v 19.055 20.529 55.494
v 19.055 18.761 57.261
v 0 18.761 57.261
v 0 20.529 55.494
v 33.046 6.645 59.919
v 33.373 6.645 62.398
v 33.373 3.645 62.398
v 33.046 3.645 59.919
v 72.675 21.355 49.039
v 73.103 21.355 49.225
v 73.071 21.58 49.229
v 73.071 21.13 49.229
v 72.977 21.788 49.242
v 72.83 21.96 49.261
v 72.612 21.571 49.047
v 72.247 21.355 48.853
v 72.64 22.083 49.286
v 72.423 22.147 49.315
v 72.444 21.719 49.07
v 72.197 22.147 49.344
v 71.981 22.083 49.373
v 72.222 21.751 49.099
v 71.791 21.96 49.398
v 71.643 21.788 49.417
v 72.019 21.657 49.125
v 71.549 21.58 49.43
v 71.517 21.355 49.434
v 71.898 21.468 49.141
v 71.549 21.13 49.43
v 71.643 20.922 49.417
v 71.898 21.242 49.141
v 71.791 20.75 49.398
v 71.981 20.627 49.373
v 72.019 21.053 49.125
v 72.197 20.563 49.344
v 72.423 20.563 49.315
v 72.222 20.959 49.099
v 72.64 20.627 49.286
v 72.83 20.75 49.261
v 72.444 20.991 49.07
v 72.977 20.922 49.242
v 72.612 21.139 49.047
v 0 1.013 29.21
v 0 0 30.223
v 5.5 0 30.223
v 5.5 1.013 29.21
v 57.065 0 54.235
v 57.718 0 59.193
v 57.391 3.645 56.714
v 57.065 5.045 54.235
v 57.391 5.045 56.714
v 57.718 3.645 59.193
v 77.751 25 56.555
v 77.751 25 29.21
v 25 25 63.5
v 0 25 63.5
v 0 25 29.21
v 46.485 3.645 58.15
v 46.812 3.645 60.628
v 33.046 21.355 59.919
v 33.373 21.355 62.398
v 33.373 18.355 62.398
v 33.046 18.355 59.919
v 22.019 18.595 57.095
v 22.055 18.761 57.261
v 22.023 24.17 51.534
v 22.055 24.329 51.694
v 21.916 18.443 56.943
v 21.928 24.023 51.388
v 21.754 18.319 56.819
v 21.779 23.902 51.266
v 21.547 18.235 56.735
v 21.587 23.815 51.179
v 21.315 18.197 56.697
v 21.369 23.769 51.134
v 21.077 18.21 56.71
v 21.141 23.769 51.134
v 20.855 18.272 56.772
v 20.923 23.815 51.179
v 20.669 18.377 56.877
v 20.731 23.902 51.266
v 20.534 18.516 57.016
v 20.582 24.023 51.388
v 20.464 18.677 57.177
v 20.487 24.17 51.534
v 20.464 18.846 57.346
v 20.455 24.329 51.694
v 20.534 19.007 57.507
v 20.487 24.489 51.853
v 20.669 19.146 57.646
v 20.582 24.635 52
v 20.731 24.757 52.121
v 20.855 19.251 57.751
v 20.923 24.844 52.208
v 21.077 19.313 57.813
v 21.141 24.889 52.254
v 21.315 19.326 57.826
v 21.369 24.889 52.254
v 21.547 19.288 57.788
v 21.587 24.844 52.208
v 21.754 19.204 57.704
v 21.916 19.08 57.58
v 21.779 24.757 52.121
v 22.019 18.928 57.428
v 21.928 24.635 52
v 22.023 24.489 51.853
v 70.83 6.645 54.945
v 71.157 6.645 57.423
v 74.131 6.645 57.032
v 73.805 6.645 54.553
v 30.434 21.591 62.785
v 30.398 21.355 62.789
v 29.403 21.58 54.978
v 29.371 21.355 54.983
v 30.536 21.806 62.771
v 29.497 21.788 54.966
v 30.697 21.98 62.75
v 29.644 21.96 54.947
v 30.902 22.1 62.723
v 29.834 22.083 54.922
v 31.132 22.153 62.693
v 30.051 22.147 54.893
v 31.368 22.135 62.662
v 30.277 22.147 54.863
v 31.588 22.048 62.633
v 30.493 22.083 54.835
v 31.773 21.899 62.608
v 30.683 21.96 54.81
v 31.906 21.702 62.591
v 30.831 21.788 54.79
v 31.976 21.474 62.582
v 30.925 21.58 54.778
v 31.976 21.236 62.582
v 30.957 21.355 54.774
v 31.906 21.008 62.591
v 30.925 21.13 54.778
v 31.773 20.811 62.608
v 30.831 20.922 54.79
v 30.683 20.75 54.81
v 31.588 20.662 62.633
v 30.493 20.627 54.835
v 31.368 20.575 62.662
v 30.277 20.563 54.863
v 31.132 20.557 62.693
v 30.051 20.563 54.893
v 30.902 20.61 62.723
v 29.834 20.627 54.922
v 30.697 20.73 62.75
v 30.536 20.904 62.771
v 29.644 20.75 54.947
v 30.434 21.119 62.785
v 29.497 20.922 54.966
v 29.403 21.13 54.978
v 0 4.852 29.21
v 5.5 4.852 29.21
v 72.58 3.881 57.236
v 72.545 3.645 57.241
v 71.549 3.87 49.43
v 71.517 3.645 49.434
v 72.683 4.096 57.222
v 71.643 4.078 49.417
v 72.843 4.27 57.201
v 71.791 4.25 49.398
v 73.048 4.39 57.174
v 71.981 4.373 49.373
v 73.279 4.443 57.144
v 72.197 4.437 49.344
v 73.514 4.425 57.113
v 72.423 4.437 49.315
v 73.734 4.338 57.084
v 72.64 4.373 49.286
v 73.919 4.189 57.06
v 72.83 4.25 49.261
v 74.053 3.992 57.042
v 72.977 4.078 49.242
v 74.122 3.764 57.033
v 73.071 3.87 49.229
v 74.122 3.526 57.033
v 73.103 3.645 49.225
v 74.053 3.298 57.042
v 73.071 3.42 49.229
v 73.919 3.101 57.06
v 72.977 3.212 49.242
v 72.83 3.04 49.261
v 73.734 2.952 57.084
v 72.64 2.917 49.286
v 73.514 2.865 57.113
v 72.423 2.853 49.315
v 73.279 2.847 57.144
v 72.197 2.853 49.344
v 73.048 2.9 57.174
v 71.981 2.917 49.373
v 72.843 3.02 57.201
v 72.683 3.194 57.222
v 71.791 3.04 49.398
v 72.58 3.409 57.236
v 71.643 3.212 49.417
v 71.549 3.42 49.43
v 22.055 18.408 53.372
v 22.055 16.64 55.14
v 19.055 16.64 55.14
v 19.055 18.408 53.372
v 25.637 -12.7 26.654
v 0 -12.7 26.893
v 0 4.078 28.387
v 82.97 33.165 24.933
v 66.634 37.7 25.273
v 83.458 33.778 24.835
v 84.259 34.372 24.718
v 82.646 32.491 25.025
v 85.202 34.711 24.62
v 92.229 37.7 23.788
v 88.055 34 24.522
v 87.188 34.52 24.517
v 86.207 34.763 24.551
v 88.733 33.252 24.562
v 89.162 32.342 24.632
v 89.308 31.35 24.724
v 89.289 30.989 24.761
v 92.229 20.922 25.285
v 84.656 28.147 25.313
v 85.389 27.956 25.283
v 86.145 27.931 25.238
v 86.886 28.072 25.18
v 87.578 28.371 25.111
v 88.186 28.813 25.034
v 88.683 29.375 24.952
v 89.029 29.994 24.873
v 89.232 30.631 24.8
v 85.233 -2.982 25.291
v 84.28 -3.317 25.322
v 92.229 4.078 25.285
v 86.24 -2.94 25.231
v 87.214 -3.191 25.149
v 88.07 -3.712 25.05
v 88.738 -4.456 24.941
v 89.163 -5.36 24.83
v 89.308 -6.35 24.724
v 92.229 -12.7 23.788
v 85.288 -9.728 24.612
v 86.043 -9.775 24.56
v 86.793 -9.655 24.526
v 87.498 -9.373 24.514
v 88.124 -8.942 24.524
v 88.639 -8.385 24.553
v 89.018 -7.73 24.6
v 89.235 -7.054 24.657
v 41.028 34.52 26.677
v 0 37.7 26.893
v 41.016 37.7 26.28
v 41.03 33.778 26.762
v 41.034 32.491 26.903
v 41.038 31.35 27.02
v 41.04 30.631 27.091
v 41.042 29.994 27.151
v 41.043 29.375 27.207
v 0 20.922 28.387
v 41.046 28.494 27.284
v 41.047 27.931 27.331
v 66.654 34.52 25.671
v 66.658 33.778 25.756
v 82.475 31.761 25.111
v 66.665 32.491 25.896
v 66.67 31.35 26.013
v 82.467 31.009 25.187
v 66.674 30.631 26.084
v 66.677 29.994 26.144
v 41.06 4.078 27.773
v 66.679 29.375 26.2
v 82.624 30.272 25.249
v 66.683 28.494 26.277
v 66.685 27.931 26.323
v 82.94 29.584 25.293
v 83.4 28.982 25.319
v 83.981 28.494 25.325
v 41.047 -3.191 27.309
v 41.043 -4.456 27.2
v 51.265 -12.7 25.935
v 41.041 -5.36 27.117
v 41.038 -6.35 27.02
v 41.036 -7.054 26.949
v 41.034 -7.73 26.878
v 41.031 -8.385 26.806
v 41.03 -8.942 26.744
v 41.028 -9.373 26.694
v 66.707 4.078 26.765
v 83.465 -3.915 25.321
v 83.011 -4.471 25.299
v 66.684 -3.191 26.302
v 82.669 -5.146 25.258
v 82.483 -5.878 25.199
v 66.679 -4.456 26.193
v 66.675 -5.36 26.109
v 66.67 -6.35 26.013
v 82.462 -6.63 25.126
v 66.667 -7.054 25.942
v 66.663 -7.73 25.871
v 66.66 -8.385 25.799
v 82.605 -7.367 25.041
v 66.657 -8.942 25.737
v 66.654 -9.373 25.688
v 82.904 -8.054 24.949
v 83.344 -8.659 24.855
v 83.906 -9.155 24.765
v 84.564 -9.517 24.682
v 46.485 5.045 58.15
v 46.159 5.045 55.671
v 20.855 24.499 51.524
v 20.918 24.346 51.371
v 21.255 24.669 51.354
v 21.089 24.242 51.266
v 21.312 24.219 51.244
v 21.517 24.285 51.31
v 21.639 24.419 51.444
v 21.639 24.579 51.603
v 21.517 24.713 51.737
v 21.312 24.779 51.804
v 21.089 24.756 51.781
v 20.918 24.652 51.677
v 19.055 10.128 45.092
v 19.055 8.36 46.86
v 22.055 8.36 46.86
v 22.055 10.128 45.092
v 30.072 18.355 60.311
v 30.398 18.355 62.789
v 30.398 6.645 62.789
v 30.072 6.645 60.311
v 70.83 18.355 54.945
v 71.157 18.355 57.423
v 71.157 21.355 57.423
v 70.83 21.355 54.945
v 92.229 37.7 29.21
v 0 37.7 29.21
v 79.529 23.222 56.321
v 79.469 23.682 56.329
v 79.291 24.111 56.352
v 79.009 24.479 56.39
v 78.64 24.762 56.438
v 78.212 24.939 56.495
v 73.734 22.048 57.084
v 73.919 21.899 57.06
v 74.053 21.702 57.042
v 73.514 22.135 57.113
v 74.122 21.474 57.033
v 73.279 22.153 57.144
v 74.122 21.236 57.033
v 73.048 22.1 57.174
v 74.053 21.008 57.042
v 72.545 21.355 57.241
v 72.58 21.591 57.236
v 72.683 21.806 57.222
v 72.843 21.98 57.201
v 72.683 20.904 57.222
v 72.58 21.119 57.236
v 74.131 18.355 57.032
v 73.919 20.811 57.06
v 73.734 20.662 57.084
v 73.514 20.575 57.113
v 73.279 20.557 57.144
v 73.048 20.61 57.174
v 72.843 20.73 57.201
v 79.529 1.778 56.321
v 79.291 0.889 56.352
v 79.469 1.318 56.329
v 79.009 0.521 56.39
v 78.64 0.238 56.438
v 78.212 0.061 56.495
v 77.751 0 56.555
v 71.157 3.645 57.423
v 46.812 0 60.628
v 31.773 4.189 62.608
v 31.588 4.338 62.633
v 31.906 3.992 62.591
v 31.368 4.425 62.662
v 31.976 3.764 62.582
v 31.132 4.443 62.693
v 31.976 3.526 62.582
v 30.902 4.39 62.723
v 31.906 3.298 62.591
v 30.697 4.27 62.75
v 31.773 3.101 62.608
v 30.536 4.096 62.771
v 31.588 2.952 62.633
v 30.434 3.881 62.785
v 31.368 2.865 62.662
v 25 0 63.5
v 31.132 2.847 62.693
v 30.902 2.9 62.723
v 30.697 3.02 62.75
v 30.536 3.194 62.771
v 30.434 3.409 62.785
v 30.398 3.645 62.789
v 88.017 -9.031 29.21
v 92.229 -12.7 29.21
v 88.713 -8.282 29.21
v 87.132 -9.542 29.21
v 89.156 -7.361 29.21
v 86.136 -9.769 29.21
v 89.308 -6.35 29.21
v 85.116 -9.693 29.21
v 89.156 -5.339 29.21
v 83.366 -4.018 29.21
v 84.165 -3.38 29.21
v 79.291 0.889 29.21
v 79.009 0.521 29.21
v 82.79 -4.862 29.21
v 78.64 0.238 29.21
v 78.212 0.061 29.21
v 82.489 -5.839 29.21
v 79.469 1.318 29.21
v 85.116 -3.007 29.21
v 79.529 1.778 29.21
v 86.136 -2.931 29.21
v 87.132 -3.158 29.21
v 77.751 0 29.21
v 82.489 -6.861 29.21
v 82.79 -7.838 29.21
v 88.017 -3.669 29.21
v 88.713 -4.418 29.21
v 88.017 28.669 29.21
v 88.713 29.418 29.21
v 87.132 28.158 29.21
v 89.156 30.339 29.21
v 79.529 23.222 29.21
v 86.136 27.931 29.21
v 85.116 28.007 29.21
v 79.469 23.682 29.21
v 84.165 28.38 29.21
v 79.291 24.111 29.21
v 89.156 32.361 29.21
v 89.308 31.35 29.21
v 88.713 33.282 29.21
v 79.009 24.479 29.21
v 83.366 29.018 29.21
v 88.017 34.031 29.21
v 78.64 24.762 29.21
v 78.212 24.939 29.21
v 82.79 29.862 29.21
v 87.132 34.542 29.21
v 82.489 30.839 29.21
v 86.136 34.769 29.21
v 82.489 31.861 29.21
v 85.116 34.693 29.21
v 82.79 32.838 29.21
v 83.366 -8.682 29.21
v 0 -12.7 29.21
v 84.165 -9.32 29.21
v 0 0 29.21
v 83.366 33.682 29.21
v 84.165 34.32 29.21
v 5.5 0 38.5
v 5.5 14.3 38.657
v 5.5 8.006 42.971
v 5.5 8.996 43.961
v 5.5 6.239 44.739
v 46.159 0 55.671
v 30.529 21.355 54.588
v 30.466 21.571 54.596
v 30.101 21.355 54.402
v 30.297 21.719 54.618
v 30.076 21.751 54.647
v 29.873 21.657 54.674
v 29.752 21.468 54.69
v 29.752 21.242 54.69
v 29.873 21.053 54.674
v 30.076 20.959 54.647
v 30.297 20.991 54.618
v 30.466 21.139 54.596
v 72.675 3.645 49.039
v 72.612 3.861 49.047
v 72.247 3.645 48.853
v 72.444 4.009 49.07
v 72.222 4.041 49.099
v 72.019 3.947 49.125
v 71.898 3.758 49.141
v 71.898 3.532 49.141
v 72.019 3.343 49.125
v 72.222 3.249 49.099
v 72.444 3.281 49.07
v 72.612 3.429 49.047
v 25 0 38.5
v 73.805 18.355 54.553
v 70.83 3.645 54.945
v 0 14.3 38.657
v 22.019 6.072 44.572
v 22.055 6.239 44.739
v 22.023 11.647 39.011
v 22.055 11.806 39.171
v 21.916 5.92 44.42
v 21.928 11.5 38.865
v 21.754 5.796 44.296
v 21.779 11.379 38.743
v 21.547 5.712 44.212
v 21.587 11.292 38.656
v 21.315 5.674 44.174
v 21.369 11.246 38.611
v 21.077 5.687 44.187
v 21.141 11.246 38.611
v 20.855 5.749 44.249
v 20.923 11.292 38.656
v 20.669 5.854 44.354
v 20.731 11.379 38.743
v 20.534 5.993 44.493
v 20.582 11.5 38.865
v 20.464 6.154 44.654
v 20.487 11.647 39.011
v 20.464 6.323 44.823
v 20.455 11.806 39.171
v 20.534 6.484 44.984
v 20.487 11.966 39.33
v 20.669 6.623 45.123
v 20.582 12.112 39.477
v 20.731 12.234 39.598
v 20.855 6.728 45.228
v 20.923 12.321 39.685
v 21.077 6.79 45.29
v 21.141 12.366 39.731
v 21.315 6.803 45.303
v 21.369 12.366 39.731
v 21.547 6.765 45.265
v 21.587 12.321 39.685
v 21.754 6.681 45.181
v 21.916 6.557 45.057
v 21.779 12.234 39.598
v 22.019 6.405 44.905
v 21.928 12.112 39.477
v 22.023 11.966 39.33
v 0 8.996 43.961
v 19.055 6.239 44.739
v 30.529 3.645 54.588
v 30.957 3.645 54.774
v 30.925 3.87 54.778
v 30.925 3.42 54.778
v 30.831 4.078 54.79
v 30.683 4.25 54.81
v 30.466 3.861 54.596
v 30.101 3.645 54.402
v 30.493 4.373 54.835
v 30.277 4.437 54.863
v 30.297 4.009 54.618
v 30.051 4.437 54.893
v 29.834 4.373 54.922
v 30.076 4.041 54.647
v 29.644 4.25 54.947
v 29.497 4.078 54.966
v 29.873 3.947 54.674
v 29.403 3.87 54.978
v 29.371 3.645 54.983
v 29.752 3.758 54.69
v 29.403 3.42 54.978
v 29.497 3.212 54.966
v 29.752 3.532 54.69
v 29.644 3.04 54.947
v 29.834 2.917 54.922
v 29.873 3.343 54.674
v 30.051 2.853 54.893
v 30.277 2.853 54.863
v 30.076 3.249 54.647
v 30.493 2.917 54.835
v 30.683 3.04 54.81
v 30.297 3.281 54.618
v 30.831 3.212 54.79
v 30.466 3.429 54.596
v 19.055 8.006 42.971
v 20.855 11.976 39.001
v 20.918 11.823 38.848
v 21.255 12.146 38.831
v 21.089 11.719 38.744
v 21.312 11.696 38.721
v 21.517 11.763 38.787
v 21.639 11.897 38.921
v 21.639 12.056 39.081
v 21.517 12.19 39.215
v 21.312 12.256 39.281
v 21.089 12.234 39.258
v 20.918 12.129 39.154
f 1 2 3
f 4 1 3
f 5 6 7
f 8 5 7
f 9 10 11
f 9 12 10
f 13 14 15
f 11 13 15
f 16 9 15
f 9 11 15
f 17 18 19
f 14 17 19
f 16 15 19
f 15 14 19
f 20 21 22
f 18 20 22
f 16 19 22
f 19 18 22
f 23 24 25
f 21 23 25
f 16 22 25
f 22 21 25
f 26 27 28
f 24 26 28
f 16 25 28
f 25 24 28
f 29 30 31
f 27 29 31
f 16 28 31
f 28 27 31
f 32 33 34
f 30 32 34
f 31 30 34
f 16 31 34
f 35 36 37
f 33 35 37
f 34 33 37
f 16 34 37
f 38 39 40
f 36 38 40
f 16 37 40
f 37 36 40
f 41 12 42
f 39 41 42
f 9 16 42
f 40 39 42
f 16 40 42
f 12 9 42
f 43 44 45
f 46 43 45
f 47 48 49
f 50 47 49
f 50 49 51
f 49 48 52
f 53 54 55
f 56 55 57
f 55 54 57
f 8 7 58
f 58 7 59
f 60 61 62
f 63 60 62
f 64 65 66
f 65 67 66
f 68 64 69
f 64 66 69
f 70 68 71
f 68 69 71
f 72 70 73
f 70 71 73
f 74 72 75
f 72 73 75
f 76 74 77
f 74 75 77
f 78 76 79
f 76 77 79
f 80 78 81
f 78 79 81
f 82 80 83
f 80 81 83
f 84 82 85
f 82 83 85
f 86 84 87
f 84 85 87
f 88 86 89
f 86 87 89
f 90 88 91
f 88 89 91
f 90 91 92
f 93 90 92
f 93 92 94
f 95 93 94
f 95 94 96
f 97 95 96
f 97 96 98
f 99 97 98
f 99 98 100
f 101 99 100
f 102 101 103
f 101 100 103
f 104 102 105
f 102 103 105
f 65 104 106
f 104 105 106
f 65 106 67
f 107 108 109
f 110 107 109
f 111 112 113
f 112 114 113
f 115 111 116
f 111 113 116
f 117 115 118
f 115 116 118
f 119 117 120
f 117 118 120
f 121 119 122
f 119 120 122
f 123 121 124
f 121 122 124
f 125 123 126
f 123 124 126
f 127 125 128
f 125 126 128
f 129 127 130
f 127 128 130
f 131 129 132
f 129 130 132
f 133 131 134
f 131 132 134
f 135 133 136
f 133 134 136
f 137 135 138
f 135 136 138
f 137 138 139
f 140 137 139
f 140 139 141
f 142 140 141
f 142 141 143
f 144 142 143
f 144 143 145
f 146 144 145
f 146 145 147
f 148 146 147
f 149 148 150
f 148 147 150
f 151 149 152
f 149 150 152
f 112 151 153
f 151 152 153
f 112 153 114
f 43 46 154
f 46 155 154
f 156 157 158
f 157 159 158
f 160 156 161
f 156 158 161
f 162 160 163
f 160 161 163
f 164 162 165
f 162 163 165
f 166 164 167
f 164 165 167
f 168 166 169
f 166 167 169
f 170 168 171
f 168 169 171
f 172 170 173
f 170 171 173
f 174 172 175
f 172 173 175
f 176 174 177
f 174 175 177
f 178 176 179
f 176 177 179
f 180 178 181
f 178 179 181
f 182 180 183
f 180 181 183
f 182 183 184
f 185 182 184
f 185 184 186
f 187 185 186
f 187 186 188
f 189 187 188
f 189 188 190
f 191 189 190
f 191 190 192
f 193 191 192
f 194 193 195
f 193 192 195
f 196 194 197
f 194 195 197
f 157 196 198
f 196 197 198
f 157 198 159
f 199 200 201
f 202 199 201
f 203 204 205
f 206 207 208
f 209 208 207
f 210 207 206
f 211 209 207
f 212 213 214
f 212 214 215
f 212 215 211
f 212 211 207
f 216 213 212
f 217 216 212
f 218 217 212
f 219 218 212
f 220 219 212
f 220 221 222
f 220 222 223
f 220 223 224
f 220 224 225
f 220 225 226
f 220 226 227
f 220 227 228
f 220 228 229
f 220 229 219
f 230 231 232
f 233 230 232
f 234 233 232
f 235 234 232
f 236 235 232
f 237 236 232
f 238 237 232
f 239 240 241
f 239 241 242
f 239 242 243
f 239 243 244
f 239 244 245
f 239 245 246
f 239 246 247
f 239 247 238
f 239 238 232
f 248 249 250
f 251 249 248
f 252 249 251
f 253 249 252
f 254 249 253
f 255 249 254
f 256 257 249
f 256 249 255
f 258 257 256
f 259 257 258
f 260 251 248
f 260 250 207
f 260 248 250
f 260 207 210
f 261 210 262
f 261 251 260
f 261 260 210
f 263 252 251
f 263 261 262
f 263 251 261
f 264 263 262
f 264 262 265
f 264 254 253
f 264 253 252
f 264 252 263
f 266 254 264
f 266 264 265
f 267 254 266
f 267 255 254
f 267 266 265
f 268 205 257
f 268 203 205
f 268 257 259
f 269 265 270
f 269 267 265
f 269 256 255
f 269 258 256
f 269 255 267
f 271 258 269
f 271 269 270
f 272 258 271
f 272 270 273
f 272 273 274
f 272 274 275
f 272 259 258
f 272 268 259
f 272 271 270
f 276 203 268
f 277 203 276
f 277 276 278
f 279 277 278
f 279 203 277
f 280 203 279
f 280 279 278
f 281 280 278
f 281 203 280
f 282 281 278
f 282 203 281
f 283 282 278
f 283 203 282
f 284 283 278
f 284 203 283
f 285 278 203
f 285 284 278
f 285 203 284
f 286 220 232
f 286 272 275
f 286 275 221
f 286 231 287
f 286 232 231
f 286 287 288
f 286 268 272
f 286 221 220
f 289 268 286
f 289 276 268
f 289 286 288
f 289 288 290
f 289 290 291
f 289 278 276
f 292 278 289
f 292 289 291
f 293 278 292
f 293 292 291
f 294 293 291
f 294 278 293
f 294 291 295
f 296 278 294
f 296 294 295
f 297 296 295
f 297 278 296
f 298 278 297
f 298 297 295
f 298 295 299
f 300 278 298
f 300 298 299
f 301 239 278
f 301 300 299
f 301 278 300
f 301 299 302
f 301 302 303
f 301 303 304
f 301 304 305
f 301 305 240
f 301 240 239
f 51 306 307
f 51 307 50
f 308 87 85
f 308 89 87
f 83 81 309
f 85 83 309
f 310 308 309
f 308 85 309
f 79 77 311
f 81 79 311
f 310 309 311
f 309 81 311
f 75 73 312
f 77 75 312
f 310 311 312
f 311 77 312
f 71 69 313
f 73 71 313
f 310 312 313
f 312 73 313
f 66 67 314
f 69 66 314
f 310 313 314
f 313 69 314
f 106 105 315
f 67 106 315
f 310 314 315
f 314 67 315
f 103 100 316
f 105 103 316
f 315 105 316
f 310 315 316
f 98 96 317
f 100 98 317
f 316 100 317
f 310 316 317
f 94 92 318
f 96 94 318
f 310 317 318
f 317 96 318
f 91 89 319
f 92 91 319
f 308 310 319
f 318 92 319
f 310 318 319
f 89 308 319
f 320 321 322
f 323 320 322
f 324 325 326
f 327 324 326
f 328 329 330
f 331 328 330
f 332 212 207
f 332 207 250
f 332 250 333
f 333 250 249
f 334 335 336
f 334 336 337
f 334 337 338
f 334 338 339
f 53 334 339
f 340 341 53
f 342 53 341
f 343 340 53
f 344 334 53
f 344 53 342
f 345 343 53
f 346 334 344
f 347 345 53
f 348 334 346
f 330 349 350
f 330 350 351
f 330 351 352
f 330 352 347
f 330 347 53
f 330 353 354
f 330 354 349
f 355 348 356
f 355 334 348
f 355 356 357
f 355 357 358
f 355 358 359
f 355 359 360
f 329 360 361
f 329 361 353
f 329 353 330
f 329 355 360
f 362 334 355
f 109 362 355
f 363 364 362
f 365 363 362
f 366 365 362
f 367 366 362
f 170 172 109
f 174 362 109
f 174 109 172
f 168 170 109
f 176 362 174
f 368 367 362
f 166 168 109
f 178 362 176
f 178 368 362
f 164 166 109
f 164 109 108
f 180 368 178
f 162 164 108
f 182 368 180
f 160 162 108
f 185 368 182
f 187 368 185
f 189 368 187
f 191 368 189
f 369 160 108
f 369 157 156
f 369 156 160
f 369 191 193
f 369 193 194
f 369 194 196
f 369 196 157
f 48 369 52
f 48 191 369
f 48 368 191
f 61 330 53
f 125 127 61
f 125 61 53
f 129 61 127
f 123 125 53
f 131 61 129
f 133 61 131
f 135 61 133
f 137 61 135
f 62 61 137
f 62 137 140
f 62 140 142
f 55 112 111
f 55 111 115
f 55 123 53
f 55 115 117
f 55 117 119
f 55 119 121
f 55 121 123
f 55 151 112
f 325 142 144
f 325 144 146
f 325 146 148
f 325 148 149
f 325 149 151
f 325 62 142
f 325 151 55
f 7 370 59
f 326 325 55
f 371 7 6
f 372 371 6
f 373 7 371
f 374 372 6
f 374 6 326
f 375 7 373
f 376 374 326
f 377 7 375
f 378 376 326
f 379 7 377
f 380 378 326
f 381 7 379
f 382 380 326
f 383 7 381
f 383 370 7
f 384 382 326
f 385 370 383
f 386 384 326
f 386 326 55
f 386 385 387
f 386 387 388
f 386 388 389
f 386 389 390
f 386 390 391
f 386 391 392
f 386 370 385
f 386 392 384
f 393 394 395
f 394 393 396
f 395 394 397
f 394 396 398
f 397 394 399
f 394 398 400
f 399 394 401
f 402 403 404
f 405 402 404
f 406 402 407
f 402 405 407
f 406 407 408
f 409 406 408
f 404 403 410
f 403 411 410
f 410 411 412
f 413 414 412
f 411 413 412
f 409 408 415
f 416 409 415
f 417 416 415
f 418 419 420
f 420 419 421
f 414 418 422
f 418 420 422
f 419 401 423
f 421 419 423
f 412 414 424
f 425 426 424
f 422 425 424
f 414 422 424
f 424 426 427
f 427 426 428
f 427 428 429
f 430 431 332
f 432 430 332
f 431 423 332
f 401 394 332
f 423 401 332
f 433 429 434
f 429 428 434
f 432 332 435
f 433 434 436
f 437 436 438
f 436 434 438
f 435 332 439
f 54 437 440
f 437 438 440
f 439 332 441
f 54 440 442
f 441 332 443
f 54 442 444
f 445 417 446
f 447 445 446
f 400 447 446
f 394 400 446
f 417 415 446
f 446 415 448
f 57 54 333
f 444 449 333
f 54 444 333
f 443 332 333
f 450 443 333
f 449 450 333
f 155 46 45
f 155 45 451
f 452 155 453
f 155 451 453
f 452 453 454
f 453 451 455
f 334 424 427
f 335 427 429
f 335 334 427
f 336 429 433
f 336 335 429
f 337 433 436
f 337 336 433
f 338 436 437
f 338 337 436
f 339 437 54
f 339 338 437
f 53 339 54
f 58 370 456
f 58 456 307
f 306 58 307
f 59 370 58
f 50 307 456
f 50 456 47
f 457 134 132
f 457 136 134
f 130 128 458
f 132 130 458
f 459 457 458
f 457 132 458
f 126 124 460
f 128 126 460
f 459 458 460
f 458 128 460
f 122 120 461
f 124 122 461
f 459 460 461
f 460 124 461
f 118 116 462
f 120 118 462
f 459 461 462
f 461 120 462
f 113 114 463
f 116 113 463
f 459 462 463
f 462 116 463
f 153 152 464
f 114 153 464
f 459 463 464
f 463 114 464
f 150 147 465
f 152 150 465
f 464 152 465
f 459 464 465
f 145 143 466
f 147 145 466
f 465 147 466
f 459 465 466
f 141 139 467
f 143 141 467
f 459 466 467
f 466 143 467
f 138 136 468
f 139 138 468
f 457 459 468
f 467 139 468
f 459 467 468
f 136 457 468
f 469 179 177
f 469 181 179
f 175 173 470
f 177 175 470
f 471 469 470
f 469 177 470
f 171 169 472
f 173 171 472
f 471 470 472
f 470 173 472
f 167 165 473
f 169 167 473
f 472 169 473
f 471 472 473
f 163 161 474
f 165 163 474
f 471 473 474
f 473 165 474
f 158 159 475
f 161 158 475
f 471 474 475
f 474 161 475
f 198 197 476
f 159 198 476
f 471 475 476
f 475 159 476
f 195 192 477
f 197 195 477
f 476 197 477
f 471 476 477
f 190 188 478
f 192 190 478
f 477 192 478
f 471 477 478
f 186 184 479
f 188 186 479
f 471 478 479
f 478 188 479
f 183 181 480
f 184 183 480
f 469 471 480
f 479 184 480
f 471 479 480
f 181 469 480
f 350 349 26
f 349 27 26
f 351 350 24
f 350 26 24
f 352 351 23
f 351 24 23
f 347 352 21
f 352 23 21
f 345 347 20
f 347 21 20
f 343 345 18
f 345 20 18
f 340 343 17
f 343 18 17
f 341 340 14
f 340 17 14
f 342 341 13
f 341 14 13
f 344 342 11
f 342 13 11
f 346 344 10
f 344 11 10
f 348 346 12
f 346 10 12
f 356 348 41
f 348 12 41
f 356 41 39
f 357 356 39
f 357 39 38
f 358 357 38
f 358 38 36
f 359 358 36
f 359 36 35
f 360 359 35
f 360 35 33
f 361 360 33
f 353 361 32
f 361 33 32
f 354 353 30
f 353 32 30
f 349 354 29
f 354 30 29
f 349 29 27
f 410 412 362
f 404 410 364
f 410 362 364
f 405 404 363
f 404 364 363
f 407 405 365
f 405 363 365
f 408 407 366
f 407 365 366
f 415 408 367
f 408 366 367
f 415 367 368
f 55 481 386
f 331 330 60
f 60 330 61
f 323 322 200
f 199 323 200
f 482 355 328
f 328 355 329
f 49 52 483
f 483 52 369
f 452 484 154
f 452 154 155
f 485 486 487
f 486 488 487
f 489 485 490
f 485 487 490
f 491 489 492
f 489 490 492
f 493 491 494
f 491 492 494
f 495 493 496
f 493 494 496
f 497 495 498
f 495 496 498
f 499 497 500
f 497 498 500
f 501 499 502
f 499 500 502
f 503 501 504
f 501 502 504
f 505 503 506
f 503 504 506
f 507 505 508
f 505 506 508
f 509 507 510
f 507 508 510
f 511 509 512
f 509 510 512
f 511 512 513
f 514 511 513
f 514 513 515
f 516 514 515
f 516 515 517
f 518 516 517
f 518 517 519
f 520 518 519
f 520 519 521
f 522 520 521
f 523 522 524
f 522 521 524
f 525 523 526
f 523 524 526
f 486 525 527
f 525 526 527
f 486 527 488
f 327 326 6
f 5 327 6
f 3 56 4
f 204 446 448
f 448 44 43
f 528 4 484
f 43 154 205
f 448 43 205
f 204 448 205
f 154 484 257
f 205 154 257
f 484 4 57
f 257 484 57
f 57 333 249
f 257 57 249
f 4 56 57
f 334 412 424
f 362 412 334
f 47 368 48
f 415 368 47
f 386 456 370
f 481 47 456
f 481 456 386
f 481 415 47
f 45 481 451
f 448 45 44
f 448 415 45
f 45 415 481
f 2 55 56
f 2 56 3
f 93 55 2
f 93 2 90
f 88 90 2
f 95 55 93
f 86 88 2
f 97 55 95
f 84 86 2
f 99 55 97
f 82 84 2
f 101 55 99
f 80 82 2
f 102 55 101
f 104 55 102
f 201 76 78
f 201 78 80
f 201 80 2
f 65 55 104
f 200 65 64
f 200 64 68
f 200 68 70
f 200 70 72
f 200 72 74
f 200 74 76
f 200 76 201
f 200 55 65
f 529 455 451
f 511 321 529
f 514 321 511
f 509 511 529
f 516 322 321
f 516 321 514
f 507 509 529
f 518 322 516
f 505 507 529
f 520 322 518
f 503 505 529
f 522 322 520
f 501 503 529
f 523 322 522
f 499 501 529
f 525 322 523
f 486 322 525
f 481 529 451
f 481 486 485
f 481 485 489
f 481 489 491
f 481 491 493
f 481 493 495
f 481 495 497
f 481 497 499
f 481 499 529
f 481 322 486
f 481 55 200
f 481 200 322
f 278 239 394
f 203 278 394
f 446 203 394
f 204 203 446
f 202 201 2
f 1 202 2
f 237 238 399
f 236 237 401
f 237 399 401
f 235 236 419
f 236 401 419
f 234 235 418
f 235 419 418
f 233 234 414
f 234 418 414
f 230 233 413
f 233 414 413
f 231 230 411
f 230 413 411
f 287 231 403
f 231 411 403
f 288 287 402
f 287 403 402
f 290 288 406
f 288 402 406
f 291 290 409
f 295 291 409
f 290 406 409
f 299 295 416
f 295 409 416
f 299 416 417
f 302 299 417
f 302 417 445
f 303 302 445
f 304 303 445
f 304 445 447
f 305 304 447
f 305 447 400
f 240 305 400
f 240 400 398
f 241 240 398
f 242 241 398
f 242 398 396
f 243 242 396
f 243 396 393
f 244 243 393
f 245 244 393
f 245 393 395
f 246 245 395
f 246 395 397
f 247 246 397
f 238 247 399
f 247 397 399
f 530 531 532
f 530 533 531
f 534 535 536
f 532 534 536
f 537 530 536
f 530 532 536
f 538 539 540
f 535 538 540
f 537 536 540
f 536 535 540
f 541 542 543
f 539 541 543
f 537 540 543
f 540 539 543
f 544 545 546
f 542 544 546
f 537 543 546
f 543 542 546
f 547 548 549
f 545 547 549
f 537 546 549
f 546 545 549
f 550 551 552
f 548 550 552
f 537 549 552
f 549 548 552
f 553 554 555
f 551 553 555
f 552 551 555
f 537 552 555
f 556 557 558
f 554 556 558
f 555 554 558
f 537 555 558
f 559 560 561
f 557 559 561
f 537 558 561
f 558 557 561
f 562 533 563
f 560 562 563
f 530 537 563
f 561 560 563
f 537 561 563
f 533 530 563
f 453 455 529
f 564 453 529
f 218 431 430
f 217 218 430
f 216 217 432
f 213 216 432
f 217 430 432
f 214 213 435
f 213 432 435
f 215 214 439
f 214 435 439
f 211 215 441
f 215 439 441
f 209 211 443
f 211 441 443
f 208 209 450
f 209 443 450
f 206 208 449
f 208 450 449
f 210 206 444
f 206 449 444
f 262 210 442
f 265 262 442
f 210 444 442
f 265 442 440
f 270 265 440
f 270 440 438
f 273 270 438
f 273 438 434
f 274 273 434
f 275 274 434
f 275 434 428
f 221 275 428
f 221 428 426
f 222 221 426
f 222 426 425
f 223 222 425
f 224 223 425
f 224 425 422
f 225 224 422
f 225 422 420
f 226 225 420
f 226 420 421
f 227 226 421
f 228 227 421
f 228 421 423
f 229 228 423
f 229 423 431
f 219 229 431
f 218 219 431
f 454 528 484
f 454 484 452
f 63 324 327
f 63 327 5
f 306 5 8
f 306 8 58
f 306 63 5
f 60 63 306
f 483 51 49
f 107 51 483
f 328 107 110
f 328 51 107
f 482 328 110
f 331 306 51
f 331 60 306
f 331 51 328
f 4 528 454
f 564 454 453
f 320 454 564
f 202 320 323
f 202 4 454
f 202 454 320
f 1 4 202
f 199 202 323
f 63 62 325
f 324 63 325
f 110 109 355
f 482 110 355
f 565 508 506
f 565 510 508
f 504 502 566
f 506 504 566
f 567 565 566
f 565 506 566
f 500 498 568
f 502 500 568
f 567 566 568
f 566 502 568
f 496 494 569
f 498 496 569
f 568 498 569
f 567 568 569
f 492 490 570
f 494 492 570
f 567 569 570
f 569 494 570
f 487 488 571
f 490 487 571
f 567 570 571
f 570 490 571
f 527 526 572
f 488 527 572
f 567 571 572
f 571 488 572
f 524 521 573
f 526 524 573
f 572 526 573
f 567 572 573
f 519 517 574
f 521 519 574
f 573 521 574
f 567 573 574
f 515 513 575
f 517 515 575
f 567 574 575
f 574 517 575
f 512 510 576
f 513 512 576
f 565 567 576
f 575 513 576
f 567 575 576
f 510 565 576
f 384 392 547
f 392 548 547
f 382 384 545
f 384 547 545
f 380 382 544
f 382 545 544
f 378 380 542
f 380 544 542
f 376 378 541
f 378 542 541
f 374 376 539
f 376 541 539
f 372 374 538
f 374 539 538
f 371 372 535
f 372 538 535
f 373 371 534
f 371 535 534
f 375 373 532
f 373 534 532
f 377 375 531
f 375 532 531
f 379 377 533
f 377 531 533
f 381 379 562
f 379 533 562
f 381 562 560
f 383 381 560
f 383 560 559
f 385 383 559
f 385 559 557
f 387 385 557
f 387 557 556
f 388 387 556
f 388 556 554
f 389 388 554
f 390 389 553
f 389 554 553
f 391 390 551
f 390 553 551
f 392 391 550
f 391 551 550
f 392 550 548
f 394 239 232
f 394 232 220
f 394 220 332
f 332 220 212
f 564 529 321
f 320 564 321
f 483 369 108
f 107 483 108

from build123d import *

# Parameters (mm, degrees)
BOSS_EXTRUDE4_DEPTH           = 25
CUT_EXTRUDE2_DEPTH            = 25
TAP_DRILL_FOR_4_40_TAP1_D     = 1.600000102
TAP_DRILL_FOR_4_40_TAP1_DEPTH = 7.874
TAP_DRILL_FOR_4_40_TAP1_TIP   = 0.480688526
TAP_DRILL_FOR_4_40_TAP3_D     = 1.600000102
TAP_DRILL_FOR_4_40_TAP3_DEPTH = 7.874
TAP_DRILL_FOR_4_40_TAP3_TIP   = 0.480688526
TAP_DRILL_FOR_4_40_TAP4_D     = 1.600000102
TAP_DRILL_FOR_4_40_TAP4_DEPTH = 7.874
TAP_DRILL_FOR_4_40_TAP4_TIP   = 0.480688526
FILLET1_R                     = 1.778
CUT_EXTRUDE3_DEPTH            = 2.5
CUT_EXTRUDE4_DEPTH            = 2.5
CUT_EXTRUDE5_DEPTH            = 2.5
SKETCH23_W                    = 11
SKETCH23_H                    = 5.045
CUT_EXTRUDE6_DEPTH            = 5
SKETCH24_W                    = 11
SKETCH24_H                    = 5.045
CUT_EXTRUDE7_DEPTH            = 5
SKETCH25_W                    = 11
SKETCH25_H                    = 16.07506189
CUT_EXTRUDE8_DEPTH            = 10
SKETCH26_W                    = 184.458934752
SKETCH26_H                    = 50.4
BOSS_EXTRUDE6_DEPTH           = 29.21
SKETCH27_R                    = 3.429
CUT_EXTRUDE9_DEPTH            = 106.37252383
SKETCH28_W                    = 115.917353875
SKETCH28_H                    = 112.19052099
CUT_EXTRUDE10_DEPTH           = 119.151659651


with BuildPart() as part:
    # Sketch6 → Boss-Extrude4 (new body)
    with BuildSketch(Plane(origin=(0, 0, 0), x_dir=(1, 0, 0), z_dir=(0, 1, 0))):
        Polygon((-79.529467376, 0), (79.529467376, 0), (79.529467376, -56.321059428), (25, -63.5), (-25, -63.5), (-79.529467376, -56.321059428), align=None)
    extrude(amount=BOSS_EXTRUDE4_DEPTH)

    # Sketch7 → Cut-Extrude2 (cut, symmetric)
    with BuildSketch(Plane(origin=(0, 0, 0), x_dir=(0, 0, -1), z_dir=(1, 0, 0))):
        Polygon((-63.5, 25), (-38.5, 0), (-63.5, 0), align=None)
    extrude(amount=CUT_EXTRUDE2_DEPTH, both=True, mode=Mode.SUBTRACT)

    # Tap Drill for #4-40 Tap1
    with Locations(Plane(origin=(0, -19.25, 19.25), x_dir=(-1, 0, 0), z_dir=(0, -0.7071067811865488, 0.7071067811865462))):
        with Locations((-21.255000035, -53.756280605), (21.255000035, -53.756280605), (21.255000035, -36.046280605), (-21.255000035, -36.046280605)):
            Hole(TAP_DRILL_FOR_4_40_TAP1_D / 2, depth=TAP_DRILL_FOR_4_40_TAP1_DEPTH)
            with Locations((0, 0, -(TAP_DRILL_FOR_4_40_TAP1_DEPTH + TAP_DRILL_FOR_4_40_TAP1_TIP / 2))):  # 118° drill point
                Cone(0, TAP_DRILL_FOR_4_40_TAP1_D / 2, TAP_DRILL_FOR_4_40_TAP1_TIP, mode=Mode.SUBTRACT)

    # Tap Drill for #4-40 Tap3
    with Locations(Plane(origin=(-8.643431853, 0, 65.653383048), x_dir=(0.9914448613738104, 0, 0.13052619222005213), z_dir=(-0.13052619222005213, 0, 0.9914448613738104))):
        with Locations((-65.252708328, 21.355), (-22.742708328, 21.355), (-22.742708328, 3.645), (-65.252708328, 3.645)):
            Hole(TAP_DRILL_FOR_4_40_TAP3_D / 2, depth=TAP_DRILL_FOR_4_40_TAP3_DEPTH)
            with Locations((0, 0, -(TAP_DRILL_FOR_4_40_TAP3_DEPTH + TAP_DRILL_FOR_4_40_TAP3_TIP / 2))):  # 118° drill point
                Cone(0, TAP_DRILL_FOR_4_40_TAP3_D / 2, TAP_DRILL_FOR_4_40_TAP3_TIP, mode=Mode.SUBTRACT)

    # Tap Drill for #4-40 Tap4
    with Locations(Plane(origin=(8.643431853, 0, 65.653383048), x_dir=(0.9914448613738104, 0, -0.13052619222005213), z_dir=(0.13052619222005213, 0, 0.9914448613738104))):
        with Locations((22.742708328, 21.355), (65.252708328, 21.355), (65.252708328, 3.645), (22.742708328, 3.645)):
            Hole(TAP_DRILL_FOR_4_40_TAP4_D / 2, depth=TAP_DRILL_FOR_4_40_TAP4_DEPTH)
            with Locations((0, 0, -(TAP_DRILL_FOR_4_40_TAP4_DEPTH + TAP_DRILL_FOR_4_40_TAP4_TIP / 2))):  # 118° drill point
                Cone(0, TAP_DRILL_FOR_4_40_TAP4_D / 2, TAP_DRILL_FOR_4_40_TAP4_TIP, mode=Mode.SUBTRACT)

    # Fillet1
    fillet1_edges = [part.edges().sort_by_distance(p)[0] for p in [
        (-79.529467376, 25, 28.160529714),
        (79.529467376, 25, 28.160529714),
        (-79.529467376, 0, 28.160529714),
        (79.529467376, 0, 28.160529714),
    ]]
    fillet(fillet1_edges, radius=FILLET1_R)

    # Sketch22 → Cut-Extrude3 (cut)
    with BuildSketch(Plane(origin=(0, -19.25, 19.25), x_dir=(1, 0, 0), z_dir=(0, -0.7071067811865488, 0.7071067811865462))):
        Polygon((-19.055000086, 53.756280605), (-19.055000086, 50.756280605), (-22.055000086, 50.756280605), (-22.055000086, 39.046280605), (-19.055000086, 39.046280605), (-19.055000086, 36.046280605), (19.055000086, 36.046280605), (19.055000086, 39.046280605), (22.055000086, 39.046280605), (22.055000086, 50.756280605), (19.055000086, 50.756280605), (19.055000086, 53.756280605), align=None)
    extrude(amount=-CUT_EXTRUDE3_DEPTH, mode=Mode.SUBTRACT)

    # Sketch21 → Cut-Extrude4 (cut)
    with BuildSketch(Plane(origin=(8.643431853, 0, 65.653383048), x_dir=(0.9914448613738104, 0, -0.13052619222005213), z_dir=(0.13052619222005213, 0, 0.9914448613738104))):
        Polygon((24.942708277, 21.355), (24.942708277, 18.355), (21.942708277, 18.355), (21.942708277, 6.645), (24.942708277, 6.645), (24.942708277, 3.645), (63.052708379, 3.645), (63.052708379, 6.645), (66.052708379, 6.645), (66.052708379, 18.355), (63.052708379, 18.355), (63.052708379, 21.355), align=None)
    extrude(amount=-CUT_EXTRUDE4_DEPTH, mode=Mode.SUBTRACT)

    # Sketch20 → Cut-Extrude5 (cut)
    with BuildSketch(Plane(origin=(-8.643431853, 0, 65.653383048), x_dir=(0.9914448613738104, 0, 0.13052619222005213), z_dir=(-0.13052619222005213, 0, 0.9914448613738104))):
        Polygon((-63.052708379, 21.355), (-63.052708379, 18.355), (-66.052708379, 18.355), (-66.052708379, 6.645), (-63.052708379, 6.645), (-63.052708379, 3.645), (-24.942708277, 3.645), (-24.942708277, 6.645), (-21.942708277, 6.645), (-21.942708277, 18.355), (-24.942708277, 18.355), (-24.942708277, 21.355), align=None)
    extrude(amount=-CUT_EXTRUDE5_DEPTH, mode=Mode.SUBTRACT)

    # Sketch23 → Cut-Extrude6 (cut)
    with BuildSketch(Plane(origin=(8.643431853, 0, 65.653383048), x_dir=(0.9914448613738104, 0, -0.13052619222005213), z_dir=(0.13052619222005213, 0, 0.9914448613738104))):
        with Locations((43.997708328, 2.5225)):
            Rectangle(SKETCH23_W, SKETCH23_H)
    extrude(amount=-CUT_EXTRUDE6_DEPTH, mode=Mode.SUBTRACT)

    # Sketch24 → Cut-Extrude7 (cut)
    with BuildSketch(Plane(origin=(-8.643431853, 0, 65.653383048), x_dir=(0.9914448613738104, 0, 0.13052619222005213), z_dir=(-0.13052619222005213, 0, 0.9914448613738104))):
        with Locations((-43.997708328, 2.5225)):
            Rectangle(SKETCH24_W, SKETCH24_H)
    extrude(amount=-CUT_EXTRUDE7_DEPTH, mode=Mode.SUBTRACT)

    # Sketch25 → Cut-Extrude8 (cut)
    with BuildSketch(Plane(origin=(0, -19.25, 19.25), x_dir=(1, 0, 0), z_dir=(0, -0.7071067811865488, 0.7071067811865462))):
        with Locations((0, 29.40874966)):
            Rectangle(SKETCH25_W, SKETCH25_H)
    extrude(amount=-CUT_EXTRUDE8_DEPTH, mode=Mode.SUBTRACT)

    # Sketch26 → Boss-Extrude6 (add)
    with BuildSketch(Plane(origin=(0, 0, 0), x_dir=(-1, 0, 0), z_dir=(0, 0, -1))):
        with Locations((0, 12.5)):
            Rectangle(SKETCH26_W, SKETCH26_H)
    extrude(amount=-BOSS_EXTRUDE6_DEPTH)

    # Sketch11 → Cut-Revolve4 (revolve, cut)
    with BuildSketch(Plane(origin=(0, 0, 0), x_dir=(0, 0, -1), z_dir=(1, 0, 0))):
        with BuildLine():
            Line((1344.295, -496.77), (1344.295, 521.77))
            add(Edge.make_bspline(
                [(1344.295, 521.77), (-28.575, 521.77), (-28.575, 12.5), (-28.575, -496.77), (1344.295, -496.77)],
                knots=[4.71238898, 4.71238898, 4.71238898, 6.283185307, 6.283185307, 7.853981634, 7.853981634, 7.853981634], degree=2, weights=[1, 0.707106781, 1, 0.707106781, 1]))
        make_face()
    revolve(axis=Axis((0, -496.77, -1344.295), (0, 1, 0)), mode=Mode.SUBTRACT)

    # Sketch27 → Cut-Extrude9 (cut, through all)
    with BuildSketch(Plane.XY.offset(29.21)):
        with Locations((85.879467376, -6.35)):
            Circle(SKETCH27_R)
        with Locations((-85.879467376, -6.35)):
            Circle(SKETCH27_R)
        with Locations((-85.879467376, 31.35)):
            Circle(SKETCH27_R)
        with Locations((85.879467376, 31.35)):
            Circle(SKETCH27_R)
    extrude(amount=-CUT_EXTRUDE9_DEPTH, mode=Mode.SUBTRACT)

    # Sketch28 → Cut-Extrude10 (cut, through all)
    with BuildSketch(Plane(origin=(0, 0, 0), x_dir=(0, 0, -1), z_dir=(1, 0, 0))):
        with Locations((-70.629213931, -16.061676163)):
            Rectangle(SKETCH28_W, SKETCH28_H)
    extrude(amount=-CUT_EXTRUDE10_DEPTH, mode=Mode.SUBTRACT)


solid = part.part
